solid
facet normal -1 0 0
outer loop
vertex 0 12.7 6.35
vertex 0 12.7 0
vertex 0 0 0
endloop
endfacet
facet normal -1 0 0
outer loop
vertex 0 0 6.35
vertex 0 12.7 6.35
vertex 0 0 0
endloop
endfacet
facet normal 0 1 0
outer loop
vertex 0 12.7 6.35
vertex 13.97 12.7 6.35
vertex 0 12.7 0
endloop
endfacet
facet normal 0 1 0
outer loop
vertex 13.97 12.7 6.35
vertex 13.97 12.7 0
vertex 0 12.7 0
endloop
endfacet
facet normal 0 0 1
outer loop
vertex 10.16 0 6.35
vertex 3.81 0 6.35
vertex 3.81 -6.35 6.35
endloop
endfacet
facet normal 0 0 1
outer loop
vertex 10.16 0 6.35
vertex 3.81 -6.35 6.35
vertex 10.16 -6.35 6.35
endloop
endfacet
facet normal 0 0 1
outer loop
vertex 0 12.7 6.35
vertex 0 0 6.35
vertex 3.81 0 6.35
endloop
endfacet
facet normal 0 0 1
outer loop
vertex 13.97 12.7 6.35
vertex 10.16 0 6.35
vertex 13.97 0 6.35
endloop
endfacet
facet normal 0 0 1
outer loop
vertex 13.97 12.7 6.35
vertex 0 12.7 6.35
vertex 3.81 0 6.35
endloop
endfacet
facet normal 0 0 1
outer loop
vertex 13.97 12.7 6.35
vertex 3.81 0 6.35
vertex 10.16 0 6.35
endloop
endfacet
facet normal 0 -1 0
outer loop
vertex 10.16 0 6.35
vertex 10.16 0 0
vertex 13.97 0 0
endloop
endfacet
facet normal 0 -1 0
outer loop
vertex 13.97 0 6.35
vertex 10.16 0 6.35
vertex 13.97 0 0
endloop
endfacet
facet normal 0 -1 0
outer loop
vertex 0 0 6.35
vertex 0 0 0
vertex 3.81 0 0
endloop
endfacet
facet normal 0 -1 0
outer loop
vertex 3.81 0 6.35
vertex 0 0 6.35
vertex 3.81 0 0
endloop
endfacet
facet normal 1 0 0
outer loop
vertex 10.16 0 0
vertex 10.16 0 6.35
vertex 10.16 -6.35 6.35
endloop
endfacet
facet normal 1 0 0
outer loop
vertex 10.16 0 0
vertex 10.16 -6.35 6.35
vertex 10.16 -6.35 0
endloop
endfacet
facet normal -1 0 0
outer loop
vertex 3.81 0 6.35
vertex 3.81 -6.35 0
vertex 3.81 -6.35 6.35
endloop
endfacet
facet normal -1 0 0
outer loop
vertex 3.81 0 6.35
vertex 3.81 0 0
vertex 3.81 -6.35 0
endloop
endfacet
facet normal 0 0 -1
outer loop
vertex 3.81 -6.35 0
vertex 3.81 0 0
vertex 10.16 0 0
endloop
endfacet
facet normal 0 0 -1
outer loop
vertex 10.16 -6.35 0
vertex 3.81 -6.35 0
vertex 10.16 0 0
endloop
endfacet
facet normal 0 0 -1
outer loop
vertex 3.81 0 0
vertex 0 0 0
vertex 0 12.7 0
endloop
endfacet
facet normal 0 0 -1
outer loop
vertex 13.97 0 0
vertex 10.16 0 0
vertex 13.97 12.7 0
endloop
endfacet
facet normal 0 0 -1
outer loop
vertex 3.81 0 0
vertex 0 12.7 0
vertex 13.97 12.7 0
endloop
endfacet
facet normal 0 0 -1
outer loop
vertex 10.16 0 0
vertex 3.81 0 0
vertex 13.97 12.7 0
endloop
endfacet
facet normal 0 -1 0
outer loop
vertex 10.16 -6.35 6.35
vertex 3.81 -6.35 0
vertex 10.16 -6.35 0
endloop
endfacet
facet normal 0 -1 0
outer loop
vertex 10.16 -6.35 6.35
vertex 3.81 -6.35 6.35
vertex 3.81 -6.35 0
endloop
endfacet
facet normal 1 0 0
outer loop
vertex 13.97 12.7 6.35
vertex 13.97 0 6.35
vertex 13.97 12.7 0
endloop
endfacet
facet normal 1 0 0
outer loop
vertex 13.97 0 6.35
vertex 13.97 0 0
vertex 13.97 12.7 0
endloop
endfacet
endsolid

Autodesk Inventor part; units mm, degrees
ref_plane "YZ Plane" through (0, 0, 0) normal (1, 0, 0) x (0, 1, 0)
ref_plane "XZ Plane" through (0, 0, 0) normal (0, 1, 0) x (-1, 0, 0)
ref_plane "XY Plane" through (0, 0, 0) normal (0, 0, 1) x (1, 0, 0)
sketch "Sketch1" plane through (0, 0, 0) normal (0, 0, 1) x (1, 0, 0)
  line L0 (0, 0) -> (13.97, 0)
  line L1 (13.97, 0) -> (13.97, 12.7)
  line L2 (13.97, 12.7) -> (0, 12.7)
  line L3 (0, 12.7) -> (0, 0)
  dimension "d0" = 13.97
  dimension "d1" = 12.7
extrude "Extrusion1" add sketch "Sketch1" along normal blind 6.35
sketch "Sketch2" plane through (0, 0, 0) normal (0, -1, 0) x (1, 0, 0)
  line L0 (0, 6.35) -> (13.97, 6.35) projected
  line L1 (0, 0) -> (13.97, 0) projected
  line L2 (3.81, 6.35) -> (10.16, 6.35)
  line L3 (10.16, 6.35) -> (10.16, 0)
  line L4 (10.16, 0) -> (3.81, 0)
  line L5 (3.81, 0) -> (3.81, 6.35)
  line L6 (0, 0) -> (0, 6.35) projected
  dimension "d4" = 6.35
  dimension "d5" = 3.81
extrude "Extrusion2" add sketch "Sketch2" along normal blind 6.35 contours L0 L3 L1 L5
properties part number "switchholder"
